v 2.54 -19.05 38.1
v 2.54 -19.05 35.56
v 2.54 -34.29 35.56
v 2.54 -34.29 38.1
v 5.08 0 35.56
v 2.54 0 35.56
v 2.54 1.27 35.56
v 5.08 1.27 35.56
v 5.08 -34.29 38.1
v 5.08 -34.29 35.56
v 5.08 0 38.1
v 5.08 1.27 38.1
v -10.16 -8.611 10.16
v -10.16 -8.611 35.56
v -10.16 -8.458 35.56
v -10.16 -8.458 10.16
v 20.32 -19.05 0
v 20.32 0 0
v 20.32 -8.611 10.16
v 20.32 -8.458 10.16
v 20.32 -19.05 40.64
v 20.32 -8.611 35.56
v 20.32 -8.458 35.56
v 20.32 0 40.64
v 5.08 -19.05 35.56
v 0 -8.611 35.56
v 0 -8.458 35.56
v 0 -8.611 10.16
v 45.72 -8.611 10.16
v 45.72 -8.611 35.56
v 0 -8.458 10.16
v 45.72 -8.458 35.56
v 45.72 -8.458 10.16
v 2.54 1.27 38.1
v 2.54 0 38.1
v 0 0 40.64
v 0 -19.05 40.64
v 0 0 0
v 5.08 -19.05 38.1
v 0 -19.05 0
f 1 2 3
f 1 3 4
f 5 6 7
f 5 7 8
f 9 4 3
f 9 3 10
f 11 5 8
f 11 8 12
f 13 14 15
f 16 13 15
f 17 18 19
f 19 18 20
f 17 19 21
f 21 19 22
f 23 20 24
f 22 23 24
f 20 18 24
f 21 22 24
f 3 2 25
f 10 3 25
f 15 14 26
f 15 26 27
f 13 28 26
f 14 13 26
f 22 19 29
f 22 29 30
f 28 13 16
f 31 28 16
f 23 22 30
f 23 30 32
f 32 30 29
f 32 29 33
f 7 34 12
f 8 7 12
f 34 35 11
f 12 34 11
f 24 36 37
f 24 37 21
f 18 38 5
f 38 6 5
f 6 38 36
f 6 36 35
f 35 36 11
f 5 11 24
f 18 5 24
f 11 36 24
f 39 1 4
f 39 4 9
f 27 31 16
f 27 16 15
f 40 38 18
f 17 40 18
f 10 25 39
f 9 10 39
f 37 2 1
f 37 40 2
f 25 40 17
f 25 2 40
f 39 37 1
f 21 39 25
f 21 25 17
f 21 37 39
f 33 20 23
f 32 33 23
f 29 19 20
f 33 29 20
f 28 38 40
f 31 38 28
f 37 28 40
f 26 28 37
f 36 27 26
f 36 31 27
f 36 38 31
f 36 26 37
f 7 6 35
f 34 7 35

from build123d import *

# Parameters (mm, degrees)
F0_W          = 20.32
F0_H          = 40.64
F1_DEPTH      = 19.05
F2_W          = 0.1524
F2_H          = 25.4
F3_DEPTH      = 25.4
F3_DEPTH_BACK = 30.48
F4_W          = 2.54
F4_H          = 2.54
F5_DEPTH      = 15.24
F5_DEPTH_BACK = 20.32


with BuildPart() as f1:
    # F0 (on Front) → F1 (new body)
    with BuildSketch(Plane.XZ):
        with Locations((10.16, 20.32)):
            Rectangle(F0_W, F0_H)
    extrude(amount=F1_DEPTH)

    # F2 (on face) → F3 (join, two sides)
    with BuildSketch(Plane.YZ.offset(20.32)) as f3_sk:
        with Locations((-8.5344, 22.86)):
            Rectangle(F2_W, F2_H)
    extrude(amount=F3_DEPTH)
    extrude(f3_sk.sketch, amount=-F3_DEPTH_BACK)

    # F4 (on face) → F5 (join, two sides)
    with BuildSketch(Plane.XZ.offset(19.05)) as f5_sk:
        with Locations((3.81, 36.83)):
            Rectangle(F4_W, F4_H)
    extrude(amount=F5_DEPTH)
    extrude(f5_sk.sketch, amount=-F5_DEPTH_BACK)


solid = f1.part
